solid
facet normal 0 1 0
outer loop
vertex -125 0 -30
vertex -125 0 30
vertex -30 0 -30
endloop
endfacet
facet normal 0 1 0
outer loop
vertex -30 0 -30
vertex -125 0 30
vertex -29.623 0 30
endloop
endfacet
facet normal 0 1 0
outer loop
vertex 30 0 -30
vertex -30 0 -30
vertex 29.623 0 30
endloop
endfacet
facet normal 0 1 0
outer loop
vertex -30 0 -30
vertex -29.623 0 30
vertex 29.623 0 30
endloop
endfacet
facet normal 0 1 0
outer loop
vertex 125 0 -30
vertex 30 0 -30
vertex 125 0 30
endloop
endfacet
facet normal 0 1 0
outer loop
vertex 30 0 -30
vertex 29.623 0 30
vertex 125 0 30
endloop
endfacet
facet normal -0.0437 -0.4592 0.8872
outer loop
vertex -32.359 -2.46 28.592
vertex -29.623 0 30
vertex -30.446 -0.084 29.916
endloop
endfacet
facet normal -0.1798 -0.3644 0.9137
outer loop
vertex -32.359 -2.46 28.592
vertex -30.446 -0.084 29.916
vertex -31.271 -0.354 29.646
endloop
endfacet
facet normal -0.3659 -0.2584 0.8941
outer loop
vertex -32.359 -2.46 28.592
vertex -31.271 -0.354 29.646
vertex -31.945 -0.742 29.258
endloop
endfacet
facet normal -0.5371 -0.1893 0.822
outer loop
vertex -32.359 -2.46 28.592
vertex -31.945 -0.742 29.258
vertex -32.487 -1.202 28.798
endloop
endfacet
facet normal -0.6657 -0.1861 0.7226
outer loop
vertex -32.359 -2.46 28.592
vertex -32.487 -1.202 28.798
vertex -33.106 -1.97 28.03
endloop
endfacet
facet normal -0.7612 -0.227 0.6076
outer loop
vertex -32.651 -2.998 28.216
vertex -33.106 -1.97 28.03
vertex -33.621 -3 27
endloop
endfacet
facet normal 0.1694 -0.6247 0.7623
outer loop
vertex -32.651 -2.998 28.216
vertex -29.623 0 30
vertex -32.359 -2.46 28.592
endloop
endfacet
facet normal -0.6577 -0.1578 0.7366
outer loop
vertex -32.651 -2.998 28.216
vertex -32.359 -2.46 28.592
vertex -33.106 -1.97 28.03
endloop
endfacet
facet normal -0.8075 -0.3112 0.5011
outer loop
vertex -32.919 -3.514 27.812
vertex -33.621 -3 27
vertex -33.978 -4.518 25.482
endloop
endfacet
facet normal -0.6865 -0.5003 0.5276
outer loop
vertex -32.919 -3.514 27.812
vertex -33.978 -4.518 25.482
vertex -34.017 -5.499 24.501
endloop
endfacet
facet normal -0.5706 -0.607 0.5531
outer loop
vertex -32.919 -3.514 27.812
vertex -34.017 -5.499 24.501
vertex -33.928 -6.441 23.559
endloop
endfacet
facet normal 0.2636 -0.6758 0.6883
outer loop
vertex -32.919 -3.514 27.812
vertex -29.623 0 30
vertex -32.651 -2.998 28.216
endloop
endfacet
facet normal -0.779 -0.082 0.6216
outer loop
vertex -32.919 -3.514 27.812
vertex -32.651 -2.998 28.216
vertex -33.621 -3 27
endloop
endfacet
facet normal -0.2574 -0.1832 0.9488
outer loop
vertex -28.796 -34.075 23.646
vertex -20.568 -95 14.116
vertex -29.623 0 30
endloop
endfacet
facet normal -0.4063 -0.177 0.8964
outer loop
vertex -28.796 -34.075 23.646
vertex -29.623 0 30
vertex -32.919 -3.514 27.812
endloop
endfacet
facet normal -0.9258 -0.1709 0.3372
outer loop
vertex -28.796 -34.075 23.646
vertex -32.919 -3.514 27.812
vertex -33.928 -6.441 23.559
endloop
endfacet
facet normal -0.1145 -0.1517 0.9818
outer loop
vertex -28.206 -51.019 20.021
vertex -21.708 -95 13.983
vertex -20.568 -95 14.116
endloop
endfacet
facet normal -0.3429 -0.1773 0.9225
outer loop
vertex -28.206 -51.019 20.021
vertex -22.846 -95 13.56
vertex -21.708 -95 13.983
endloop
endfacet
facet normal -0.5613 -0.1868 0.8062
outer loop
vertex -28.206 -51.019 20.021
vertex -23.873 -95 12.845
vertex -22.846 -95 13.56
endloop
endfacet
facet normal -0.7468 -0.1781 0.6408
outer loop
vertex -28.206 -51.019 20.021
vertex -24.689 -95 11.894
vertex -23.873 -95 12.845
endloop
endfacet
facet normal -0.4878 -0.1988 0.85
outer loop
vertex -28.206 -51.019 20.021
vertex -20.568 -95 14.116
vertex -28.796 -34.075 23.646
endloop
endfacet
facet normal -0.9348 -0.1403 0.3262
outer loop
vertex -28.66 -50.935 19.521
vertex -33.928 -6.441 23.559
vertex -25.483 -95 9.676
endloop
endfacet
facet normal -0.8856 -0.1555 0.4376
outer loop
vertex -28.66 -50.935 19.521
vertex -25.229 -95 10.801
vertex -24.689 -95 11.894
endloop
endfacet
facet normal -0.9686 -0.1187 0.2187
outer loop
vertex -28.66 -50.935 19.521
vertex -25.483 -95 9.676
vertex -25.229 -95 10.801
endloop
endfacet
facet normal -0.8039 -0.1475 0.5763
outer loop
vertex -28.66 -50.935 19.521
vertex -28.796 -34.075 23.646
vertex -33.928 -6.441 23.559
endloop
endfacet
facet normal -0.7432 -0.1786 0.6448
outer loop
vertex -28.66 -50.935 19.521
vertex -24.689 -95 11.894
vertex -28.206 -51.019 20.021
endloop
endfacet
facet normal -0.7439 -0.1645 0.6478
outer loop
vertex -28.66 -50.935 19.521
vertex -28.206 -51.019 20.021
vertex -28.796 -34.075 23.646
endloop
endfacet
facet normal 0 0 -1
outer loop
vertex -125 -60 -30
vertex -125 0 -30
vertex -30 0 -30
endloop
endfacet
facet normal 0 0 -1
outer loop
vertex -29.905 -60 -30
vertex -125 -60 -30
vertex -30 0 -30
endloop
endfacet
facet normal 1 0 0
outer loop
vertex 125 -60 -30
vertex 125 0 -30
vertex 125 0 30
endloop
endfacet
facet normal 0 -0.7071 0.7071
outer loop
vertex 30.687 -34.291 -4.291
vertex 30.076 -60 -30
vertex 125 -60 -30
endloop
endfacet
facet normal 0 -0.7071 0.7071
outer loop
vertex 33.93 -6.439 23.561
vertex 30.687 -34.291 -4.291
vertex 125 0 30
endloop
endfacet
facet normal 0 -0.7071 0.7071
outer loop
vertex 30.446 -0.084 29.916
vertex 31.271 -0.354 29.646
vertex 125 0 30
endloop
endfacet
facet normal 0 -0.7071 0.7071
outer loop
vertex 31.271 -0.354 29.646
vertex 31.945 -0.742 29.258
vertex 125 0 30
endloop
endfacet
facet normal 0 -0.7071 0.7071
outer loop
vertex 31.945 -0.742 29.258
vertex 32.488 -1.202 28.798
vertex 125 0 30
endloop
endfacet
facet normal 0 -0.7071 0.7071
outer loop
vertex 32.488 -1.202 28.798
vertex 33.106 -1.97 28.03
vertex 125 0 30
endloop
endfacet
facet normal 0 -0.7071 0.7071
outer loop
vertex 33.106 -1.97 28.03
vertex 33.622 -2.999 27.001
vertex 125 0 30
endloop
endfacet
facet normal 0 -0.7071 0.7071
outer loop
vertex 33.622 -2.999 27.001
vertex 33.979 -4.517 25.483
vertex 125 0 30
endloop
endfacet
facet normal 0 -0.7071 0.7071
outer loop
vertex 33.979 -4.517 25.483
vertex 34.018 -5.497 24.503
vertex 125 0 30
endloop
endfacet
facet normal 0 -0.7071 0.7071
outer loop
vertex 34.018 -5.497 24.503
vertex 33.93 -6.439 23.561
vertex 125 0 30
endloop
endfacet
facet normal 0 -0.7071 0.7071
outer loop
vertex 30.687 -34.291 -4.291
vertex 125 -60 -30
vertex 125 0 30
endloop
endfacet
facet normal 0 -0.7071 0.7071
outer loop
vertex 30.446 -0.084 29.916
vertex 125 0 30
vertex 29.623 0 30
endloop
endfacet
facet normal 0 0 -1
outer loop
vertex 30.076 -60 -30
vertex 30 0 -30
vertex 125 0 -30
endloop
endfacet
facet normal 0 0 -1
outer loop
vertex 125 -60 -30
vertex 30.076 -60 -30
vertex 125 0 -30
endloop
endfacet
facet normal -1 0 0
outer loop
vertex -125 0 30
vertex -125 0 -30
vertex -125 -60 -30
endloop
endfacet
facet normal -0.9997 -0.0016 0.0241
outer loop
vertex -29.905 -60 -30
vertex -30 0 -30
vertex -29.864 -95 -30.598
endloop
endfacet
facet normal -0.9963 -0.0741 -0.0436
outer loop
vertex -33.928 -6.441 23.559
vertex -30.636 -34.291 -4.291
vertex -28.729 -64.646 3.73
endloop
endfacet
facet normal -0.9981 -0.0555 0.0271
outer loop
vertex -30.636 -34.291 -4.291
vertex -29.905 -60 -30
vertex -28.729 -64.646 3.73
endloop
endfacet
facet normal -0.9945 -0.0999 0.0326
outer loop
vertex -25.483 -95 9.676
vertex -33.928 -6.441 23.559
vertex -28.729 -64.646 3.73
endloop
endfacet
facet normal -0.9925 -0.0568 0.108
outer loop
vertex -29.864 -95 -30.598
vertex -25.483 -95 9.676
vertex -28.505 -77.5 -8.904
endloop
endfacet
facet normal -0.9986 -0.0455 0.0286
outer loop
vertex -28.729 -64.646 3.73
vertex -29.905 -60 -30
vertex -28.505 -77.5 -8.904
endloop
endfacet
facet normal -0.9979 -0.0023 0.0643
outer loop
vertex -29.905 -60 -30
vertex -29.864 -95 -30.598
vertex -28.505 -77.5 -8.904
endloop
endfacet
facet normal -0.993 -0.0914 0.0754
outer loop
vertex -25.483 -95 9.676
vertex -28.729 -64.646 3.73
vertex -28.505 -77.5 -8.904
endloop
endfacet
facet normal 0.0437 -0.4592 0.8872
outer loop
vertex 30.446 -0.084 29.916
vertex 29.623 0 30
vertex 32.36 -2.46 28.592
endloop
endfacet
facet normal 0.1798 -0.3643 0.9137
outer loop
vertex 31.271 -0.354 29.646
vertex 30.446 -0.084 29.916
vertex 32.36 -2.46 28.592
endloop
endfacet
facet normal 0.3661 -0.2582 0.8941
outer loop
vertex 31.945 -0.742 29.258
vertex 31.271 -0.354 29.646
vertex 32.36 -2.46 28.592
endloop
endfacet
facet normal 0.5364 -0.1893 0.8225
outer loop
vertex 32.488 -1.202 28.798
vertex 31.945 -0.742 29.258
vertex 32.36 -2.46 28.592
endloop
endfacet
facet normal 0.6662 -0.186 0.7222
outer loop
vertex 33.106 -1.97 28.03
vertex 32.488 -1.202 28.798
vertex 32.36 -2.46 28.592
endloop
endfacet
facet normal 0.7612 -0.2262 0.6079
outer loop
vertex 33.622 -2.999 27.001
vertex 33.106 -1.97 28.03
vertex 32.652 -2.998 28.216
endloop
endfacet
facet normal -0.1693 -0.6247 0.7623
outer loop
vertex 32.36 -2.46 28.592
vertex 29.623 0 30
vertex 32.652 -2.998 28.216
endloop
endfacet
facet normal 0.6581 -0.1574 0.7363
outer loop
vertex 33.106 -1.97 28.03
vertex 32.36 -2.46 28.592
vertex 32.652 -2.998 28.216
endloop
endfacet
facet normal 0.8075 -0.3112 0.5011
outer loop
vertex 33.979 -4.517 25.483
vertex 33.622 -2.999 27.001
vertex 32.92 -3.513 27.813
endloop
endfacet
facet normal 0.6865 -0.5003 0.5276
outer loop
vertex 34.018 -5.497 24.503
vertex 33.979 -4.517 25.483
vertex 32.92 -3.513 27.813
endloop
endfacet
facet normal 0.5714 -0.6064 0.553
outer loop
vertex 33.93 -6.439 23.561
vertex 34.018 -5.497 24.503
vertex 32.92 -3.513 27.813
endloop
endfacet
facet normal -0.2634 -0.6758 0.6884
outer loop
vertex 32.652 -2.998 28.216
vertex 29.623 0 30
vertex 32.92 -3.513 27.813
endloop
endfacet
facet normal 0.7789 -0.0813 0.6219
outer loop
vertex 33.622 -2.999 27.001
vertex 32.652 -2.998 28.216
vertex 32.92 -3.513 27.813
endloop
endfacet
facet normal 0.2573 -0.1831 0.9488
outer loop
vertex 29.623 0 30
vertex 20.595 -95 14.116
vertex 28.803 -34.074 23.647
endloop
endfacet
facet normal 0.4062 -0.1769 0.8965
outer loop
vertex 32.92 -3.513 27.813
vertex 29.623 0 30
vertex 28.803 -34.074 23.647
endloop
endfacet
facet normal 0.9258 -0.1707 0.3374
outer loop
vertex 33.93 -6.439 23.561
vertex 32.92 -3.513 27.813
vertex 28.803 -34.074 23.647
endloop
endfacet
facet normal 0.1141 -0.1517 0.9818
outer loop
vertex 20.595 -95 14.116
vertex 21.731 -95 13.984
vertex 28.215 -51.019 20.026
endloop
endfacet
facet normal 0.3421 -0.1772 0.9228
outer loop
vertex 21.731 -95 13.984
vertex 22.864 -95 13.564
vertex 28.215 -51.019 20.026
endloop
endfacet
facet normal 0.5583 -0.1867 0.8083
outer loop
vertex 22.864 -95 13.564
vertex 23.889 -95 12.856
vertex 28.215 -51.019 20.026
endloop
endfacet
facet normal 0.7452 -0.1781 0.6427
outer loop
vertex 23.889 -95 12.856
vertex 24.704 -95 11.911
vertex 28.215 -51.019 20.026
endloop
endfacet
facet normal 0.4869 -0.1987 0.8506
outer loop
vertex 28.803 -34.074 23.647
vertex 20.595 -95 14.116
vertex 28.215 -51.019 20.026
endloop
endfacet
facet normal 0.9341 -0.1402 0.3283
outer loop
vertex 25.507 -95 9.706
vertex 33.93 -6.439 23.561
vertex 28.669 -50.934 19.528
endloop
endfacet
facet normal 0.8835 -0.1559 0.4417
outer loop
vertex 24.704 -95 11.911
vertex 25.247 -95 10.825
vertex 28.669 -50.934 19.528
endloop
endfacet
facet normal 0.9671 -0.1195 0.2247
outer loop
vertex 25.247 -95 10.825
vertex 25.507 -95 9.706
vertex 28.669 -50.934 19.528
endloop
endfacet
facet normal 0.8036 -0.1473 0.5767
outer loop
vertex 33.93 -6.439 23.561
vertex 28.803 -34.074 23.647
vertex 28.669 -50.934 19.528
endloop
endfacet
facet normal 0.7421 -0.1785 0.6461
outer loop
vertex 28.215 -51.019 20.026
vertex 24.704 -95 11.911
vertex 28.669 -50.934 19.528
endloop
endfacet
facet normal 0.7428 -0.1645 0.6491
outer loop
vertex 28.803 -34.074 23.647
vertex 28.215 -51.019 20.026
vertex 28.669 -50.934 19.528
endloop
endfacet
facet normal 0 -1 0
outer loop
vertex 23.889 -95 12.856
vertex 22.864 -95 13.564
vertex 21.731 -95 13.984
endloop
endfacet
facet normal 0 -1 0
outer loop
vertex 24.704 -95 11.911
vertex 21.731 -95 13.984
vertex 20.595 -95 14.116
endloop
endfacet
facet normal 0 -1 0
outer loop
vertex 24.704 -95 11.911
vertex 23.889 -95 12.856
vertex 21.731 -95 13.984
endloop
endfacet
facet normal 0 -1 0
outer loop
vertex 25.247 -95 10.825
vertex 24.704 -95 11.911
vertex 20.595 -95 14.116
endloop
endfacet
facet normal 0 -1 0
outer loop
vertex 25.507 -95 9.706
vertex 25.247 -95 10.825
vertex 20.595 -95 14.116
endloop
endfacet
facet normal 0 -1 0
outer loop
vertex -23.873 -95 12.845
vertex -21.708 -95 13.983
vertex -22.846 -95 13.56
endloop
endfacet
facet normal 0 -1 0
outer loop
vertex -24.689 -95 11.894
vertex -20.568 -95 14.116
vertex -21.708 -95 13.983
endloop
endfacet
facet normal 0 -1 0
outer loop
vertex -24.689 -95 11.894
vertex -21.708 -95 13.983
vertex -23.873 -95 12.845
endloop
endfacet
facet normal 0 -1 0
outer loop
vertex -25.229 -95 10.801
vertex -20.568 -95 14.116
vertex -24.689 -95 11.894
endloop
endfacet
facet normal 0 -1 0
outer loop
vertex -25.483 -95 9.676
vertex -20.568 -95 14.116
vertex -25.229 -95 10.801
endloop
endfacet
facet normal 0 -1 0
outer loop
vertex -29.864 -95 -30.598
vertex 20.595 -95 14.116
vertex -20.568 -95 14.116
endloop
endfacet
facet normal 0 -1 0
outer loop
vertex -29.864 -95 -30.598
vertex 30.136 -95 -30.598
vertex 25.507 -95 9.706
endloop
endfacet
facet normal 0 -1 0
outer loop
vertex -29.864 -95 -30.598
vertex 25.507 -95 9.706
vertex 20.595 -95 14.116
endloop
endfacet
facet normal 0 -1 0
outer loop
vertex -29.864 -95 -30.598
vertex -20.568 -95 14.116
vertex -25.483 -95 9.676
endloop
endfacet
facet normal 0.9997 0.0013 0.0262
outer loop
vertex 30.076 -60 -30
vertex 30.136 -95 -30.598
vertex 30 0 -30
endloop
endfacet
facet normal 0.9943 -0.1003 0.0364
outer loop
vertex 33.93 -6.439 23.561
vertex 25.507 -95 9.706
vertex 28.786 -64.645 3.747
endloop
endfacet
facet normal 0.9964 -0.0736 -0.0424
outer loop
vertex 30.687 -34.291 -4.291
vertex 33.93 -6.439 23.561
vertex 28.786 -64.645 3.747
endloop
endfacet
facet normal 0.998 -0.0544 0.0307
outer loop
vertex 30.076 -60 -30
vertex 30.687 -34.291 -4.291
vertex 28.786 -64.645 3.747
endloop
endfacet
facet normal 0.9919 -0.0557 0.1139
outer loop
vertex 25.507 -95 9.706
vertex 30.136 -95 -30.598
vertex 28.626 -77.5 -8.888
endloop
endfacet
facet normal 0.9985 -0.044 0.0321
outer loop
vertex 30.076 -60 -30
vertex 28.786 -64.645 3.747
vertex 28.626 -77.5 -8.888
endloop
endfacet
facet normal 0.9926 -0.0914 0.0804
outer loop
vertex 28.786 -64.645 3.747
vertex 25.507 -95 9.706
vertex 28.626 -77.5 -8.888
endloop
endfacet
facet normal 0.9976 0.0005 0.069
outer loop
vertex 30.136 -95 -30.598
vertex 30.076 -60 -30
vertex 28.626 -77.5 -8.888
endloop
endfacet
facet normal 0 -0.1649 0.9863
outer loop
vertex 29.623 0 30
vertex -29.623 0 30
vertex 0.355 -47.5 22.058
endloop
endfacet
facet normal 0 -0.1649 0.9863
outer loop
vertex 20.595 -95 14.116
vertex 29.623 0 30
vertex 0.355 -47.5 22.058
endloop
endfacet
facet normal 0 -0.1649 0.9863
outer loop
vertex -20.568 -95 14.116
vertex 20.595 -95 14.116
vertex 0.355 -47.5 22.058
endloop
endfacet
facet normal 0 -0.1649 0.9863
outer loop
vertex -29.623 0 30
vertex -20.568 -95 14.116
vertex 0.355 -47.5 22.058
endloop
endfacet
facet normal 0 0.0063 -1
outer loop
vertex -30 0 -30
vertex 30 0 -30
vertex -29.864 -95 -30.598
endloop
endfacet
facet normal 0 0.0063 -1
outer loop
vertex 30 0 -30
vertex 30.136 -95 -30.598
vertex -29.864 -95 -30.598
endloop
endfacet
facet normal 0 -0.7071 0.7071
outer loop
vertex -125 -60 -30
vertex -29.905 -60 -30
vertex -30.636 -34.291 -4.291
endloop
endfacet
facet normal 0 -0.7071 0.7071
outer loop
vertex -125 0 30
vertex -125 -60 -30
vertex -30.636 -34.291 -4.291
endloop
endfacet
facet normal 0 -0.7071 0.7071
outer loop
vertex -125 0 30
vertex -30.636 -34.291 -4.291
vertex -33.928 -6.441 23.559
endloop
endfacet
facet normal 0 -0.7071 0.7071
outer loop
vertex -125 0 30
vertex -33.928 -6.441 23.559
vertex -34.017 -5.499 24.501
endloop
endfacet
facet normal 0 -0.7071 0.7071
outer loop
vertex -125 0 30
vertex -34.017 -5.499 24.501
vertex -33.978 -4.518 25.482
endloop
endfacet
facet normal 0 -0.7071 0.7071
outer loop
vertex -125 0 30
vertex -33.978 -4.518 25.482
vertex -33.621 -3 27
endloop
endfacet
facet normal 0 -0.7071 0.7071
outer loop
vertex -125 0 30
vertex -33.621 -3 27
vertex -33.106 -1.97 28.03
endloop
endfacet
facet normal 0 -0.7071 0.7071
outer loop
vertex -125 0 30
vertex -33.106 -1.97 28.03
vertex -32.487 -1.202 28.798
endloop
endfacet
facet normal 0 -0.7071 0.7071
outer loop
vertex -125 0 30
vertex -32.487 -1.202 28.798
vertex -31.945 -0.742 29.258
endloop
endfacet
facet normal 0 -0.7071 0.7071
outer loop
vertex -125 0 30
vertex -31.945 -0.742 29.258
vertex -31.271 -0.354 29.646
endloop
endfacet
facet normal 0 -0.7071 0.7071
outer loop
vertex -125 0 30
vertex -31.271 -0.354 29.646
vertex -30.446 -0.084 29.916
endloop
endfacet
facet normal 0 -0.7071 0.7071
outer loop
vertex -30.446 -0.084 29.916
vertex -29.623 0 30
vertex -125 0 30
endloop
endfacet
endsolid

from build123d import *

# Parameters (mm, degrees)
F0_W     = 250
F0_H     = 60
F1_DEPTH = 60
F3_DEPTH = 250
F8_R     = 5


with BuildPart() as f1:
    # F0 (on Front) → F1 (new body)
    with BuildSketch(Plane.XZ):
        Rectangle(F0_W, F0_H)
    extrude(amount=F1_DEPTH)

    # F2 (on face) → F3 (cut)
    with BuildSketch(Plane.YZ.offset(125)):
        Polygon((-60, -30), (0, 30), (-60, 30), align=None)
    extrude(amount=-F3_DEPTH, mode=Mode.SUBTRACT)

    # F4 (on face) → F7 section 0
    with BuildSketch(Plane(origin=(0, 0, 0), x_dir=(-1, 0, 0), z_dir=(0, 1, 0))):
        Polygon((35, 30), (-35, 30), (-30, -30), (30, -30), align=None)
    # F6 (on offset) → F7 section 1
    with BuildSketch(Plane.XZ.offset(95)):
        Polygon((25, 14.1158560291), (-25, 14.1158560291), (-29.863614589, -30.5979736149), (30.136385411, -30.5979736149), align=None)
    loft()

    # F8
    f8_edges = [f1.edges().sort_by_distance(p)[0] for p in [
        (30, -47.5, 22.057928),
        (-30, -47.5, 22.057928),
    ]]
    fillet(f8_edges, radius=F8_R)


solid = f1.part
